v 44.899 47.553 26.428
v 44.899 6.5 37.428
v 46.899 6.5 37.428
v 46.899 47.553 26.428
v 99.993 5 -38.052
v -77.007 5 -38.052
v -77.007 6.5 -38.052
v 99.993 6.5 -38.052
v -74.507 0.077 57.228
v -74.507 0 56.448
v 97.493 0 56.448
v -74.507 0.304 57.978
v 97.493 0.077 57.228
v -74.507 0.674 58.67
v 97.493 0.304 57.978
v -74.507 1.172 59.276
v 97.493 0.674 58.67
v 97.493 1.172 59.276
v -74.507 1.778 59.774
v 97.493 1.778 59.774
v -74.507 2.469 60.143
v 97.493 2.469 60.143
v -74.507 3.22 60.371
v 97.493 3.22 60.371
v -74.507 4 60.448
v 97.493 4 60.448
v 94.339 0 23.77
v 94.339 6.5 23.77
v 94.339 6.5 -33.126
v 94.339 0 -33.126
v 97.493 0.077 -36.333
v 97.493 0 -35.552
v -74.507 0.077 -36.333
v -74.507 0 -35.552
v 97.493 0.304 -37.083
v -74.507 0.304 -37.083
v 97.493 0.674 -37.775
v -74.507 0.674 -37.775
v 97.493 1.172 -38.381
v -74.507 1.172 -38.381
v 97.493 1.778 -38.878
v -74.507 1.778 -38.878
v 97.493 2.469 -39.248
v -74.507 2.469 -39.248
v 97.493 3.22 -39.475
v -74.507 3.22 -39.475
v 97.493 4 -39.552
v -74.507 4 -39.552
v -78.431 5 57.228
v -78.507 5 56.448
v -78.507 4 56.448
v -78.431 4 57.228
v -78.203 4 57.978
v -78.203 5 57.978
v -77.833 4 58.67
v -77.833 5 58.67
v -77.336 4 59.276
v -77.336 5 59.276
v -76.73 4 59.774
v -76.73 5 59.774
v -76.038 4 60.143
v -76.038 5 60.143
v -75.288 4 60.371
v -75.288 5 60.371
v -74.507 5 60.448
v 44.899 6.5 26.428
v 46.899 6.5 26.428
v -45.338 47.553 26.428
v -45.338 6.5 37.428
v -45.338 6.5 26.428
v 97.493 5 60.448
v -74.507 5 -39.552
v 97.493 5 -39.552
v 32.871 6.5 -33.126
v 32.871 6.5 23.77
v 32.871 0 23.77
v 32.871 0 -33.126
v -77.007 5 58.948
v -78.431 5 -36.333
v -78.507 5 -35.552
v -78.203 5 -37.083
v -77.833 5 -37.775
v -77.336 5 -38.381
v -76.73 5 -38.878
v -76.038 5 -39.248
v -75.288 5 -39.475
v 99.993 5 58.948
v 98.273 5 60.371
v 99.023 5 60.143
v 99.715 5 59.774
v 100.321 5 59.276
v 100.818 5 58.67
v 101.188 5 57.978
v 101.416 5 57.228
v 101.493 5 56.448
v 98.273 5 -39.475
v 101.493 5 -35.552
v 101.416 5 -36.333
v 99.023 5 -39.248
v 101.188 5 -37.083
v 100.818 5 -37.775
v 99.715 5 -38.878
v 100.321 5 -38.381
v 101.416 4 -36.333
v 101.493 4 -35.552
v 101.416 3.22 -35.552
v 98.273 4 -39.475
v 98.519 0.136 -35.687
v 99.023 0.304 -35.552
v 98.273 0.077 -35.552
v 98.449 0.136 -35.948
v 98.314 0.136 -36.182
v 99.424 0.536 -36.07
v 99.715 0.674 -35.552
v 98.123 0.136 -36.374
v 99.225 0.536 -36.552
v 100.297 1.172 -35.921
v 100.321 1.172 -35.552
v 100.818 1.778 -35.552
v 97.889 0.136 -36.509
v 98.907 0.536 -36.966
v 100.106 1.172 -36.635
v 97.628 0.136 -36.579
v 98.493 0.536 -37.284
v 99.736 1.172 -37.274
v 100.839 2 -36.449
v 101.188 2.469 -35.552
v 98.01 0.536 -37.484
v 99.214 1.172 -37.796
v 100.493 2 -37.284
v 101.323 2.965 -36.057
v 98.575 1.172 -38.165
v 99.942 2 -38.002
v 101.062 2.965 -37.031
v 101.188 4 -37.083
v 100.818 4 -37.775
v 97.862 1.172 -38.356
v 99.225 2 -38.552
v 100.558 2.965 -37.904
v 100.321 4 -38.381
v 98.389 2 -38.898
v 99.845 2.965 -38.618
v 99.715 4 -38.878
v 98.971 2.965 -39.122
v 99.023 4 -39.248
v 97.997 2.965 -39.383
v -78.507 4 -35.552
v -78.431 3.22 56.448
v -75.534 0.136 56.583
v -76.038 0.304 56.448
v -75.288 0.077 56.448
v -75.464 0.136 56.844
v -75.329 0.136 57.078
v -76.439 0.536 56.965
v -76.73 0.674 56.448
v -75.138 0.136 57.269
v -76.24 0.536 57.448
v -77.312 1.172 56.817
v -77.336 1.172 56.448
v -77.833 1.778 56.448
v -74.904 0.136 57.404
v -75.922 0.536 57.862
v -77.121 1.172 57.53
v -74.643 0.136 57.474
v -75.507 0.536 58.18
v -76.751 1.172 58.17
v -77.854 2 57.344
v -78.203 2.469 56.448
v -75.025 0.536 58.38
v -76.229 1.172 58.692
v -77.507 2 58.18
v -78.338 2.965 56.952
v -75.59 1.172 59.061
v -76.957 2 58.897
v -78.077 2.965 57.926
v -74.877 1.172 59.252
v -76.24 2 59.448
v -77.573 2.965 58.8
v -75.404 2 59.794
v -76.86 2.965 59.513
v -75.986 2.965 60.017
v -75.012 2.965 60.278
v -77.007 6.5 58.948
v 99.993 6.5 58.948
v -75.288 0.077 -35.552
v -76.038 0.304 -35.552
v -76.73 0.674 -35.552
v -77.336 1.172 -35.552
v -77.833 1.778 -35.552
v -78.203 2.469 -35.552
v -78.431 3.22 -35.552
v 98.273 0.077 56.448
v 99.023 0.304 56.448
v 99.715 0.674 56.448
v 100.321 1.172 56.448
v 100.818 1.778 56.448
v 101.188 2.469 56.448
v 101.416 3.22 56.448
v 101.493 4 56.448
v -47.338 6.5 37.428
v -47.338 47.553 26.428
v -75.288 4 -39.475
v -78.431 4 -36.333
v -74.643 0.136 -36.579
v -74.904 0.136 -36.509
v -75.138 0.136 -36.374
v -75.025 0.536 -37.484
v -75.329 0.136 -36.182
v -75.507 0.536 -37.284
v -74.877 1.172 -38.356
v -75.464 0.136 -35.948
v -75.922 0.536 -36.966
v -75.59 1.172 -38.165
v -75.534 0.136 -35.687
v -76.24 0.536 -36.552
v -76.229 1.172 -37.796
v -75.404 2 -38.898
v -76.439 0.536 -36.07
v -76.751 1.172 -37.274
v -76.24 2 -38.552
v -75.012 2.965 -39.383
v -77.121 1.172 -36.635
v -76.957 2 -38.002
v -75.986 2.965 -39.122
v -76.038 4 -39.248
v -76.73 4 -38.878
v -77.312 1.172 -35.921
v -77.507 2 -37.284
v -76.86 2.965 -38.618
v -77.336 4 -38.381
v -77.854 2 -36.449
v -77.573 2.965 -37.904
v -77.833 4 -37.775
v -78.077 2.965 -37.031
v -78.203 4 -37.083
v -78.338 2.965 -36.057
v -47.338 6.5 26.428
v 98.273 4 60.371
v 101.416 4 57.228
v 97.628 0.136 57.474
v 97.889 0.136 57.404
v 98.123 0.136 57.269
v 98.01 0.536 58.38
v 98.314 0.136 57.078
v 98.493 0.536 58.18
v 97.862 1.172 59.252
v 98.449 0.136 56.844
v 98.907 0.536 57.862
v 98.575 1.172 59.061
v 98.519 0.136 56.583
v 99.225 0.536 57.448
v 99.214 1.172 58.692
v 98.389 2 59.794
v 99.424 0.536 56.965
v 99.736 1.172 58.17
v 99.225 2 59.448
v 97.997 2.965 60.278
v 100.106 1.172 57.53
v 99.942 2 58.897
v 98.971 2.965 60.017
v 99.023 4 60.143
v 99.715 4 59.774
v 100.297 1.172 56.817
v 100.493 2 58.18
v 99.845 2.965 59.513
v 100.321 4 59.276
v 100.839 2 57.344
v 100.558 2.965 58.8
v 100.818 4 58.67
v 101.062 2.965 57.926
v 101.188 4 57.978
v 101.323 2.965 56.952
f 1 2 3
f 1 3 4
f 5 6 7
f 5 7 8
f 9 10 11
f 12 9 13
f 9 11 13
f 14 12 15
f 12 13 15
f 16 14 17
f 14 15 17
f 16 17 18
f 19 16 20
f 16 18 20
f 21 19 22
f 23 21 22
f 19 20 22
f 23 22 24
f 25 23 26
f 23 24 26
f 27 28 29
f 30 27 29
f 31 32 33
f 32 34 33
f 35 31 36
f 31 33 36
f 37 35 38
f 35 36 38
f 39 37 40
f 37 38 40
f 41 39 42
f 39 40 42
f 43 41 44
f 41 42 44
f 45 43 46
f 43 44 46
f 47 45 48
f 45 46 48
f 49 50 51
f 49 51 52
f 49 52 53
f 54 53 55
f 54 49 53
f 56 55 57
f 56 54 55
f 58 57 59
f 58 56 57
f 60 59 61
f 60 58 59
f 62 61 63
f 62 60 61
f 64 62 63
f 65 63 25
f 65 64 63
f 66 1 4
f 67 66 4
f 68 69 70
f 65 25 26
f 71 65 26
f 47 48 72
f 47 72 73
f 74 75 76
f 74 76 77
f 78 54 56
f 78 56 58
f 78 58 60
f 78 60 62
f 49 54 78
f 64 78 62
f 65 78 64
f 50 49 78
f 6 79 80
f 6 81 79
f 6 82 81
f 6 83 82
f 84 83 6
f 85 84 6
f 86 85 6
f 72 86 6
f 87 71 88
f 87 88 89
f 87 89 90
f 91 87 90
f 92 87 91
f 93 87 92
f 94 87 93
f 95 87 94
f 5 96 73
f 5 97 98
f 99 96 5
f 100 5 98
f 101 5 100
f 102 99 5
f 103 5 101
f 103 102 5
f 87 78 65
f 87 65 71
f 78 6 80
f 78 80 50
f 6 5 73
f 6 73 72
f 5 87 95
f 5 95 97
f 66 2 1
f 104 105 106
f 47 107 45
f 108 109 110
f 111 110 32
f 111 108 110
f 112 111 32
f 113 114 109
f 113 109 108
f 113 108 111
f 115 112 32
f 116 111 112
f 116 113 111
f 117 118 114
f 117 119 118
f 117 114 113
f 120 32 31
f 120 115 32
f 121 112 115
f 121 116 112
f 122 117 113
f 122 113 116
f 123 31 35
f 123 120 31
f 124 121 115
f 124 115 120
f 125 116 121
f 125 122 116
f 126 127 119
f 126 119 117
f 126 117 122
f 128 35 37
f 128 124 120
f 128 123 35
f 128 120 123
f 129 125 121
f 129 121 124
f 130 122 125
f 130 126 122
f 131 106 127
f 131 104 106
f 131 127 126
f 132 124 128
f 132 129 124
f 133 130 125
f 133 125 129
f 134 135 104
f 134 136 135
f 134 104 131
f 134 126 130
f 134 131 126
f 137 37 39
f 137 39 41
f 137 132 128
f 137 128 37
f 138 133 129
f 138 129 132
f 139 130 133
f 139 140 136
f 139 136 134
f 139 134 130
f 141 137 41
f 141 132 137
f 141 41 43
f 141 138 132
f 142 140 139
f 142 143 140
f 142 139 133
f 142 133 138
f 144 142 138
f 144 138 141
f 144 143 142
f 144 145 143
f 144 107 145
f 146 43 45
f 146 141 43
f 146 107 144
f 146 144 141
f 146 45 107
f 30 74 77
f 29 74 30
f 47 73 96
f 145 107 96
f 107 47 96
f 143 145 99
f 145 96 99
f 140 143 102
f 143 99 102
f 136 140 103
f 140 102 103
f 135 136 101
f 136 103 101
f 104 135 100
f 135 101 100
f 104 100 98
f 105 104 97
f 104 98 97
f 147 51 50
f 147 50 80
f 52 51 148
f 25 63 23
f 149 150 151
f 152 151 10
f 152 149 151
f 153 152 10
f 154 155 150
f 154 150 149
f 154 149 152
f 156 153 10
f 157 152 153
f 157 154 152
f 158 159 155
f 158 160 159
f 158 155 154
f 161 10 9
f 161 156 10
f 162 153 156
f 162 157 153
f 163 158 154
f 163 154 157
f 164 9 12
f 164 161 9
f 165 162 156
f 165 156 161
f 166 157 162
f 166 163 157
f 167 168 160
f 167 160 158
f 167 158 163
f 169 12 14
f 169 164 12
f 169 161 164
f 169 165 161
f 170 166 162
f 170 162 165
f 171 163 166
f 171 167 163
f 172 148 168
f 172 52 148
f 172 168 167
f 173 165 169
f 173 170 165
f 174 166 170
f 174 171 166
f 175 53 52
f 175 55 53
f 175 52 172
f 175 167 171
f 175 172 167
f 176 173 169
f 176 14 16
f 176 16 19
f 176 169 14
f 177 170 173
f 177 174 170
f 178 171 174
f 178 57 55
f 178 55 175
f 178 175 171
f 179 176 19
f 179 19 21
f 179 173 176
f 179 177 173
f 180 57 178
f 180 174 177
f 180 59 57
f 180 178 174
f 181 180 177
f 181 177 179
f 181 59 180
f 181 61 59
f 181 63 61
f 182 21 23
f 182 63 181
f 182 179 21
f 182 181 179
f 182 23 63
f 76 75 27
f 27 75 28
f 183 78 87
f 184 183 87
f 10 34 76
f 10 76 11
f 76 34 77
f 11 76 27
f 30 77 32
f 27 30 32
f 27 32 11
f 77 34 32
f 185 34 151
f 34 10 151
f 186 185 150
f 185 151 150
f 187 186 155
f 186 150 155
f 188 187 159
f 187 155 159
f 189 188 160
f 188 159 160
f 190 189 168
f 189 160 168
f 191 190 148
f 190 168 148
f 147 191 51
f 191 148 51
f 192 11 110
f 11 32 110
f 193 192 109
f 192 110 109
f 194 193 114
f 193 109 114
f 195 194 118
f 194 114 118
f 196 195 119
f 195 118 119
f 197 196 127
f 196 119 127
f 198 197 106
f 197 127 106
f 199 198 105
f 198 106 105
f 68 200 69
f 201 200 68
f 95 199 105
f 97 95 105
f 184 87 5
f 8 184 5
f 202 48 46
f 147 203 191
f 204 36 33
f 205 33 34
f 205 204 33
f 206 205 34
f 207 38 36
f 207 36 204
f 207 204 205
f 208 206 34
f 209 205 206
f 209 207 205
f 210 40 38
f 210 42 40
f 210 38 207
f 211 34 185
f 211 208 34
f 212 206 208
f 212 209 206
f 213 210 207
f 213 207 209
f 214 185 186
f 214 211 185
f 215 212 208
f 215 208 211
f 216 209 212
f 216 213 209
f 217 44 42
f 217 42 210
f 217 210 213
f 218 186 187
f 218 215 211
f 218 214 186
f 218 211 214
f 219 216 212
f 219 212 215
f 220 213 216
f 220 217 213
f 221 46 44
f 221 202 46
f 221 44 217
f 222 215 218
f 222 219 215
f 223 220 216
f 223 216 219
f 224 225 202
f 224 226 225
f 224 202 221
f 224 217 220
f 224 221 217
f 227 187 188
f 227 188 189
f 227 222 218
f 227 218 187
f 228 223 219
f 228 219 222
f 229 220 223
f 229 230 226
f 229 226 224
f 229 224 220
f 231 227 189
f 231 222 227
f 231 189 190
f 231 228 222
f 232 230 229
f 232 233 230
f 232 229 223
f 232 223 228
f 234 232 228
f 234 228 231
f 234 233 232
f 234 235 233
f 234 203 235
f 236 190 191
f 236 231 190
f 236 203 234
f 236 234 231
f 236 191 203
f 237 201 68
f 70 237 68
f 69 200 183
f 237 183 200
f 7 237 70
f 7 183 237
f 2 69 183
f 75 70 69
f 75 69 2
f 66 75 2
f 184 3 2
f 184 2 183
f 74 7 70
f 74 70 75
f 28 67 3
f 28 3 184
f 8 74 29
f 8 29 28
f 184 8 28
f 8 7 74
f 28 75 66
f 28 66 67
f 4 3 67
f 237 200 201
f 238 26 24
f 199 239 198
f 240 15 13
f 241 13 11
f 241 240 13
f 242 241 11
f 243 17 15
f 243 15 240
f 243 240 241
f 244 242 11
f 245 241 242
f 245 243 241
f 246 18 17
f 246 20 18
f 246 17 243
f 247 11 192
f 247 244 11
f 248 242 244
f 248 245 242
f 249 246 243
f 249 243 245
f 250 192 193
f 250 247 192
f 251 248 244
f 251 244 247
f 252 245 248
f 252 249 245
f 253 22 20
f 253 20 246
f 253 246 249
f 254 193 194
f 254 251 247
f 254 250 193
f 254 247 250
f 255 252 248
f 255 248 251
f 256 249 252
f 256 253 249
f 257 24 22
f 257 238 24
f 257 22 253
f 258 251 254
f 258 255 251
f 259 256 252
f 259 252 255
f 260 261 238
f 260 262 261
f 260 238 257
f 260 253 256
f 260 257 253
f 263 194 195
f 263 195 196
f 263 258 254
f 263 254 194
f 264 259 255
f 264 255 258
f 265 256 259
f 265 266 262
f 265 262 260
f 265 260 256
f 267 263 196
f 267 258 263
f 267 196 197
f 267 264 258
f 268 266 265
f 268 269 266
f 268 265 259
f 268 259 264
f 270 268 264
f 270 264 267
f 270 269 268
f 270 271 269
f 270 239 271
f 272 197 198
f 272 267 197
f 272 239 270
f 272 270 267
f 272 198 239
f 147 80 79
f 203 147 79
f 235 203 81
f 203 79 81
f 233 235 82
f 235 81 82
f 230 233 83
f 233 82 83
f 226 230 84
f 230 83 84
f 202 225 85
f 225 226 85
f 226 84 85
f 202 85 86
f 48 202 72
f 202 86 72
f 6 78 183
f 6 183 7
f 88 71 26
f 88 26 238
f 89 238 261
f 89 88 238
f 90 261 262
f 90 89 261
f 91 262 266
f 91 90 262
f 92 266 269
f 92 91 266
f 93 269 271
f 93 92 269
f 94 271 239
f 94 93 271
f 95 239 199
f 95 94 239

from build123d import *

# Parameters (mm, degrees)
SKETCH1_W               = 180
SKETCH1_H               = 100
BOSS_EXTRUDE1_DEPTH     = 5
SKETCH2_W               = 177
SKETCH2_H               = 97
BOSS_EXTRUDE2_DEPTH     = 1.5
CUT_EXTRUDE1_REACH      = 120.309
SKETCH3_W               = 61.468
SKETCH3_H               = 56.896
FILLET3_R               = 4
FILLET4_R               = 4
SKETCH5_W               = 2
SKETCH5_H               = 11
BOSS_EXTRUDE3_DEPTH     = 55
SKETCH7_W               = 2
SKETCH7_H               = 11
BOSS_EXTRUDE4_DEPTH     = 55
CUT_EXTRUDE3_DEPTH      = 153.194061156
CUT_EXTRUDE3_DEPTH_BACK = 153.194061156


with BuildPart() as part:
    # Sketch1 → Boss-Extrude1 (new body)
    with BuildSketch(Plane(origin=(0, 0, 0), x_dir=(1, 0, 0), z_dir=(0, 1, 0))):
        with Locations((11.492537313, -10.447761194)):
            Rectangle(SKETCH1_W, SKETCH1_H)
    extrude(amount=BOSS_EXTRUDE1_DEPTH)

    # Sketch2 → Boss-Extrude2 (add)
    with BuildSketch(Plane(origin=(0, 5, 0), x_dir=(1, 0, 0), z_dir=(0, 1, 0))):
        with Locations((11.492537313, -10.447761194)):
            Rectangle(SKETCH2_W, SKETCH2_H)
    extrude(amount=BOSS_EXTRUDE2_DEPTH)

    # Sketch3 → Cut-Extrude1 (cut, up to next)
    with BuildSketch(Plane(origin=(0, 6.5, 0), x_dir=(1, 0, 0), z_dir=(0, 1, 0)), mode=Mode.PRIVATE) as cut_extrude1_sk1:
        with Locations((63.60476585, 4.678190655)):
            Rectangle(SKETCH3_W, SKETCH3_H)
    cut_extrude1_tool1 = extrude(cut_extrude1_sk1.sketch, amount=-CUT_EXTRUDE1_REACH, mode=Mode.PRIVATE) & part.part
    add(cut_extrude1_tool1.solids().sort_by_distance((63.604766, 6.5, -4.678191))[0], mode=Mode.SUBTRACT)

    # Fillet3
    fillet3_edges = [part.edges().sort_by_distance(p)[0] for p in [
        (-78.507462687, 2.5, -39.552238806),
        (101.492537313, 2.5, -39.552238806),
        (101.492537313, 2.5, 60.447761194),
        (-78.507462687, 2.5, 60.447761194),
    ]]
    fillet(fillet3_edges, radius=FILLET3_R)

    # Fillet4
    fillet4_edges = [part.edges().sort_by_distance(p)[0] for p in [
        (11.492537313, 0, 60.447761194),
        (-78.507462687, 0, 10.447761194),
        (11.492537313, 0, -39.552238806),
        (101.492537313, 0, 10.447761194),
        (100.320964438, 0, 59.276188319),
        (100.320964438, 0, -38.380665931),
        (-77.335889811, 0, -38.380665931),
        (-77.335889811, 0, 59.276188319),
    ]]
    fillet(fillet4_edges, radius=FILLET4_R)

    # Sketch5 → Boss-Extrude3 (add)
    with BuildSketch(Plane(origin=(0, 6.5, 0), x_dir=(1, 0, 0), z_dir=(0, 1, 0))):
        with Locations((-46.337817573, -31.927761194)):
            Rectangle(SKETCH5_W, SKETCH5_H)
    extrude(amount=BOSS_EXTRUDE3_DEPTH)

    # Sketch7 → Boss-Extrude4 (add)
    with BuildSketch(Plane(origin=(0, 6.5, 0), x_dir=(1, 0, 0), z_dir=(0, 1, 0))):
        with Locations((45.899277236, -31.927761194)):
            Rectangle(SKETCH7_W, SKETCH7_H)
    extrude(amount=BOSS_EXTRUDE4_DEPTH)

    # Sketch8 → Cut-Extrude3 (cut, two sides: drawn at the far end of the back side and taken through both)
    with BuildSketch(Plane(origin=(46.899277236, 0, 0), x_dir=(0, 0, -1), z_dir=(1, 0, 0)).offset(-CUT_EXTRUDE3_DEPTH_BACK)):
        Polygon((-37.427761194, 61.5), (-37.427761194, 6.5), (-26.427761194, 47.552558883), (-26.427761194, 61.5), align=None)
    extrude(amount=CUT_EXTRUDE3_DEPTH + CUT_EXTRUDE3_DEPTH_BACK, mode=Mode.SUBTRACT)


solid = part.part
